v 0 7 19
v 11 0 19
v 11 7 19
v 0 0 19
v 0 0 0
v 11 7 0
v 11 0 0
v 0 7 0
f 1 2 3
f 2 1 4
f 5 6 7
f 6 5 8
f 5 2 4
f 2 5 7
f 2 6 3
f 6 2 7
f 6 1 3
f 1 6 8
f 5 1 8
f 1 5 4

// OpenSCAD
// Generated by SolidPython 1.0.1 on 2020-07-29 00:46:55


cube(size = [11, 7, 19]);
/***********************************************
*********      SolidPython code:      **********
************************************************
 
# import packages: SolidPython
from solid import *
from solid.utils import *
from itertools import chain, combinations, permutations


class Resize:

    def __init__(self, scad_file):
        self.scad_file = scad_file
        #self.scad_file = import_scad(scad_file)
        # cone/cylinder param:
        self.r1 = 0
        self.r2 = 0
        self.h = 0
        # rectangular prism param:
        self.w = 0
        self.l = 0
        # ellipse param:
        self.r = 0

    # import OpenScad code (file name corresponds to shape)


    # classify shape + parameters
    def assign(self, param1, param2, param3):
        if self.scad_file == 'cone.scad':
            self.r1 = param1
            self.r2 = param2
            self.h = param3
        elif self.scad_file == 'cylinder.scad':
            self.r1 = param1
            self.r2 = param2
            self.h = param3
        elif self.scad_file == 'rectangularPrism.scad':
            self.h = param1
            self.l = param2
            self.w = param3
        else:
            self.r = param1
            self.h = param2

    # resize parameters
    def iterate(self):
        x = range(3, 20, 2)
        i = 1
        if self.scad_file == 'cone.scad':
            tempList = list(permutations(x, 2))
            for temp in tempList:
                param1 = temp[0]
                param2 = temp[1]
                filepath = 'produced_scad_files/' + 'cone' + str(param1) + '_' + str(param2) + '_' + '.scad'
                scad_render_to_file(cylinder(h=param1, r1=param2, r2=0), filepath)

        elif self.scad_file == 'cylinder.scad':
            tempList = list(permutations(x, 3))
            for temp in tempList:
                param1 = temp[0]
                param2 = temp[1]
                filepath = 'produced_scad_files/' + 'cylinder' + str(param1) + '_' + str(param2) + '_' + '.scad'
                scad_render_to_file(cylinder(h=param1, r1=param2, r2=param2), filepath)

        elif self.scad_file == 'rectangularPrism.scad':
            tempList = list(permutations(x, 3))
            for temp in tempList:
                param1 = temp[0]
                param2 = temp[1]
                param3 = temp[2]
                filepath = 'produced_scad_files/' + 'rectangularPrism' + str(param1) + '_' + str(param2) + '_' + str(
                    param3) + '.scad'
                scad_render_to_file(cube(size=(param1, param2, param3)), filepath)

        elif self.scad_file == 'ellipse.scad':
            tempList = list(permutations(x, 4))
            for temp in tempList:
                param1 = temp[0]
                param2 = temp[1]
                param3 = temp[2]
                param4 = temp[3]
                filepath = 'produced_scad_files/' + 'ellipse' + str(param1) + '_' + str(param2) + '_' + str(param3) + '_' + str(param4) + '.scad'
                scad_render_to_file(scale([param1, param2, param3])(sphere(r=param4)), filepath)

    def render_to_scadfile(self):
        scad_render_to_file(scad, 'example.scad') 
 
************************************************/
